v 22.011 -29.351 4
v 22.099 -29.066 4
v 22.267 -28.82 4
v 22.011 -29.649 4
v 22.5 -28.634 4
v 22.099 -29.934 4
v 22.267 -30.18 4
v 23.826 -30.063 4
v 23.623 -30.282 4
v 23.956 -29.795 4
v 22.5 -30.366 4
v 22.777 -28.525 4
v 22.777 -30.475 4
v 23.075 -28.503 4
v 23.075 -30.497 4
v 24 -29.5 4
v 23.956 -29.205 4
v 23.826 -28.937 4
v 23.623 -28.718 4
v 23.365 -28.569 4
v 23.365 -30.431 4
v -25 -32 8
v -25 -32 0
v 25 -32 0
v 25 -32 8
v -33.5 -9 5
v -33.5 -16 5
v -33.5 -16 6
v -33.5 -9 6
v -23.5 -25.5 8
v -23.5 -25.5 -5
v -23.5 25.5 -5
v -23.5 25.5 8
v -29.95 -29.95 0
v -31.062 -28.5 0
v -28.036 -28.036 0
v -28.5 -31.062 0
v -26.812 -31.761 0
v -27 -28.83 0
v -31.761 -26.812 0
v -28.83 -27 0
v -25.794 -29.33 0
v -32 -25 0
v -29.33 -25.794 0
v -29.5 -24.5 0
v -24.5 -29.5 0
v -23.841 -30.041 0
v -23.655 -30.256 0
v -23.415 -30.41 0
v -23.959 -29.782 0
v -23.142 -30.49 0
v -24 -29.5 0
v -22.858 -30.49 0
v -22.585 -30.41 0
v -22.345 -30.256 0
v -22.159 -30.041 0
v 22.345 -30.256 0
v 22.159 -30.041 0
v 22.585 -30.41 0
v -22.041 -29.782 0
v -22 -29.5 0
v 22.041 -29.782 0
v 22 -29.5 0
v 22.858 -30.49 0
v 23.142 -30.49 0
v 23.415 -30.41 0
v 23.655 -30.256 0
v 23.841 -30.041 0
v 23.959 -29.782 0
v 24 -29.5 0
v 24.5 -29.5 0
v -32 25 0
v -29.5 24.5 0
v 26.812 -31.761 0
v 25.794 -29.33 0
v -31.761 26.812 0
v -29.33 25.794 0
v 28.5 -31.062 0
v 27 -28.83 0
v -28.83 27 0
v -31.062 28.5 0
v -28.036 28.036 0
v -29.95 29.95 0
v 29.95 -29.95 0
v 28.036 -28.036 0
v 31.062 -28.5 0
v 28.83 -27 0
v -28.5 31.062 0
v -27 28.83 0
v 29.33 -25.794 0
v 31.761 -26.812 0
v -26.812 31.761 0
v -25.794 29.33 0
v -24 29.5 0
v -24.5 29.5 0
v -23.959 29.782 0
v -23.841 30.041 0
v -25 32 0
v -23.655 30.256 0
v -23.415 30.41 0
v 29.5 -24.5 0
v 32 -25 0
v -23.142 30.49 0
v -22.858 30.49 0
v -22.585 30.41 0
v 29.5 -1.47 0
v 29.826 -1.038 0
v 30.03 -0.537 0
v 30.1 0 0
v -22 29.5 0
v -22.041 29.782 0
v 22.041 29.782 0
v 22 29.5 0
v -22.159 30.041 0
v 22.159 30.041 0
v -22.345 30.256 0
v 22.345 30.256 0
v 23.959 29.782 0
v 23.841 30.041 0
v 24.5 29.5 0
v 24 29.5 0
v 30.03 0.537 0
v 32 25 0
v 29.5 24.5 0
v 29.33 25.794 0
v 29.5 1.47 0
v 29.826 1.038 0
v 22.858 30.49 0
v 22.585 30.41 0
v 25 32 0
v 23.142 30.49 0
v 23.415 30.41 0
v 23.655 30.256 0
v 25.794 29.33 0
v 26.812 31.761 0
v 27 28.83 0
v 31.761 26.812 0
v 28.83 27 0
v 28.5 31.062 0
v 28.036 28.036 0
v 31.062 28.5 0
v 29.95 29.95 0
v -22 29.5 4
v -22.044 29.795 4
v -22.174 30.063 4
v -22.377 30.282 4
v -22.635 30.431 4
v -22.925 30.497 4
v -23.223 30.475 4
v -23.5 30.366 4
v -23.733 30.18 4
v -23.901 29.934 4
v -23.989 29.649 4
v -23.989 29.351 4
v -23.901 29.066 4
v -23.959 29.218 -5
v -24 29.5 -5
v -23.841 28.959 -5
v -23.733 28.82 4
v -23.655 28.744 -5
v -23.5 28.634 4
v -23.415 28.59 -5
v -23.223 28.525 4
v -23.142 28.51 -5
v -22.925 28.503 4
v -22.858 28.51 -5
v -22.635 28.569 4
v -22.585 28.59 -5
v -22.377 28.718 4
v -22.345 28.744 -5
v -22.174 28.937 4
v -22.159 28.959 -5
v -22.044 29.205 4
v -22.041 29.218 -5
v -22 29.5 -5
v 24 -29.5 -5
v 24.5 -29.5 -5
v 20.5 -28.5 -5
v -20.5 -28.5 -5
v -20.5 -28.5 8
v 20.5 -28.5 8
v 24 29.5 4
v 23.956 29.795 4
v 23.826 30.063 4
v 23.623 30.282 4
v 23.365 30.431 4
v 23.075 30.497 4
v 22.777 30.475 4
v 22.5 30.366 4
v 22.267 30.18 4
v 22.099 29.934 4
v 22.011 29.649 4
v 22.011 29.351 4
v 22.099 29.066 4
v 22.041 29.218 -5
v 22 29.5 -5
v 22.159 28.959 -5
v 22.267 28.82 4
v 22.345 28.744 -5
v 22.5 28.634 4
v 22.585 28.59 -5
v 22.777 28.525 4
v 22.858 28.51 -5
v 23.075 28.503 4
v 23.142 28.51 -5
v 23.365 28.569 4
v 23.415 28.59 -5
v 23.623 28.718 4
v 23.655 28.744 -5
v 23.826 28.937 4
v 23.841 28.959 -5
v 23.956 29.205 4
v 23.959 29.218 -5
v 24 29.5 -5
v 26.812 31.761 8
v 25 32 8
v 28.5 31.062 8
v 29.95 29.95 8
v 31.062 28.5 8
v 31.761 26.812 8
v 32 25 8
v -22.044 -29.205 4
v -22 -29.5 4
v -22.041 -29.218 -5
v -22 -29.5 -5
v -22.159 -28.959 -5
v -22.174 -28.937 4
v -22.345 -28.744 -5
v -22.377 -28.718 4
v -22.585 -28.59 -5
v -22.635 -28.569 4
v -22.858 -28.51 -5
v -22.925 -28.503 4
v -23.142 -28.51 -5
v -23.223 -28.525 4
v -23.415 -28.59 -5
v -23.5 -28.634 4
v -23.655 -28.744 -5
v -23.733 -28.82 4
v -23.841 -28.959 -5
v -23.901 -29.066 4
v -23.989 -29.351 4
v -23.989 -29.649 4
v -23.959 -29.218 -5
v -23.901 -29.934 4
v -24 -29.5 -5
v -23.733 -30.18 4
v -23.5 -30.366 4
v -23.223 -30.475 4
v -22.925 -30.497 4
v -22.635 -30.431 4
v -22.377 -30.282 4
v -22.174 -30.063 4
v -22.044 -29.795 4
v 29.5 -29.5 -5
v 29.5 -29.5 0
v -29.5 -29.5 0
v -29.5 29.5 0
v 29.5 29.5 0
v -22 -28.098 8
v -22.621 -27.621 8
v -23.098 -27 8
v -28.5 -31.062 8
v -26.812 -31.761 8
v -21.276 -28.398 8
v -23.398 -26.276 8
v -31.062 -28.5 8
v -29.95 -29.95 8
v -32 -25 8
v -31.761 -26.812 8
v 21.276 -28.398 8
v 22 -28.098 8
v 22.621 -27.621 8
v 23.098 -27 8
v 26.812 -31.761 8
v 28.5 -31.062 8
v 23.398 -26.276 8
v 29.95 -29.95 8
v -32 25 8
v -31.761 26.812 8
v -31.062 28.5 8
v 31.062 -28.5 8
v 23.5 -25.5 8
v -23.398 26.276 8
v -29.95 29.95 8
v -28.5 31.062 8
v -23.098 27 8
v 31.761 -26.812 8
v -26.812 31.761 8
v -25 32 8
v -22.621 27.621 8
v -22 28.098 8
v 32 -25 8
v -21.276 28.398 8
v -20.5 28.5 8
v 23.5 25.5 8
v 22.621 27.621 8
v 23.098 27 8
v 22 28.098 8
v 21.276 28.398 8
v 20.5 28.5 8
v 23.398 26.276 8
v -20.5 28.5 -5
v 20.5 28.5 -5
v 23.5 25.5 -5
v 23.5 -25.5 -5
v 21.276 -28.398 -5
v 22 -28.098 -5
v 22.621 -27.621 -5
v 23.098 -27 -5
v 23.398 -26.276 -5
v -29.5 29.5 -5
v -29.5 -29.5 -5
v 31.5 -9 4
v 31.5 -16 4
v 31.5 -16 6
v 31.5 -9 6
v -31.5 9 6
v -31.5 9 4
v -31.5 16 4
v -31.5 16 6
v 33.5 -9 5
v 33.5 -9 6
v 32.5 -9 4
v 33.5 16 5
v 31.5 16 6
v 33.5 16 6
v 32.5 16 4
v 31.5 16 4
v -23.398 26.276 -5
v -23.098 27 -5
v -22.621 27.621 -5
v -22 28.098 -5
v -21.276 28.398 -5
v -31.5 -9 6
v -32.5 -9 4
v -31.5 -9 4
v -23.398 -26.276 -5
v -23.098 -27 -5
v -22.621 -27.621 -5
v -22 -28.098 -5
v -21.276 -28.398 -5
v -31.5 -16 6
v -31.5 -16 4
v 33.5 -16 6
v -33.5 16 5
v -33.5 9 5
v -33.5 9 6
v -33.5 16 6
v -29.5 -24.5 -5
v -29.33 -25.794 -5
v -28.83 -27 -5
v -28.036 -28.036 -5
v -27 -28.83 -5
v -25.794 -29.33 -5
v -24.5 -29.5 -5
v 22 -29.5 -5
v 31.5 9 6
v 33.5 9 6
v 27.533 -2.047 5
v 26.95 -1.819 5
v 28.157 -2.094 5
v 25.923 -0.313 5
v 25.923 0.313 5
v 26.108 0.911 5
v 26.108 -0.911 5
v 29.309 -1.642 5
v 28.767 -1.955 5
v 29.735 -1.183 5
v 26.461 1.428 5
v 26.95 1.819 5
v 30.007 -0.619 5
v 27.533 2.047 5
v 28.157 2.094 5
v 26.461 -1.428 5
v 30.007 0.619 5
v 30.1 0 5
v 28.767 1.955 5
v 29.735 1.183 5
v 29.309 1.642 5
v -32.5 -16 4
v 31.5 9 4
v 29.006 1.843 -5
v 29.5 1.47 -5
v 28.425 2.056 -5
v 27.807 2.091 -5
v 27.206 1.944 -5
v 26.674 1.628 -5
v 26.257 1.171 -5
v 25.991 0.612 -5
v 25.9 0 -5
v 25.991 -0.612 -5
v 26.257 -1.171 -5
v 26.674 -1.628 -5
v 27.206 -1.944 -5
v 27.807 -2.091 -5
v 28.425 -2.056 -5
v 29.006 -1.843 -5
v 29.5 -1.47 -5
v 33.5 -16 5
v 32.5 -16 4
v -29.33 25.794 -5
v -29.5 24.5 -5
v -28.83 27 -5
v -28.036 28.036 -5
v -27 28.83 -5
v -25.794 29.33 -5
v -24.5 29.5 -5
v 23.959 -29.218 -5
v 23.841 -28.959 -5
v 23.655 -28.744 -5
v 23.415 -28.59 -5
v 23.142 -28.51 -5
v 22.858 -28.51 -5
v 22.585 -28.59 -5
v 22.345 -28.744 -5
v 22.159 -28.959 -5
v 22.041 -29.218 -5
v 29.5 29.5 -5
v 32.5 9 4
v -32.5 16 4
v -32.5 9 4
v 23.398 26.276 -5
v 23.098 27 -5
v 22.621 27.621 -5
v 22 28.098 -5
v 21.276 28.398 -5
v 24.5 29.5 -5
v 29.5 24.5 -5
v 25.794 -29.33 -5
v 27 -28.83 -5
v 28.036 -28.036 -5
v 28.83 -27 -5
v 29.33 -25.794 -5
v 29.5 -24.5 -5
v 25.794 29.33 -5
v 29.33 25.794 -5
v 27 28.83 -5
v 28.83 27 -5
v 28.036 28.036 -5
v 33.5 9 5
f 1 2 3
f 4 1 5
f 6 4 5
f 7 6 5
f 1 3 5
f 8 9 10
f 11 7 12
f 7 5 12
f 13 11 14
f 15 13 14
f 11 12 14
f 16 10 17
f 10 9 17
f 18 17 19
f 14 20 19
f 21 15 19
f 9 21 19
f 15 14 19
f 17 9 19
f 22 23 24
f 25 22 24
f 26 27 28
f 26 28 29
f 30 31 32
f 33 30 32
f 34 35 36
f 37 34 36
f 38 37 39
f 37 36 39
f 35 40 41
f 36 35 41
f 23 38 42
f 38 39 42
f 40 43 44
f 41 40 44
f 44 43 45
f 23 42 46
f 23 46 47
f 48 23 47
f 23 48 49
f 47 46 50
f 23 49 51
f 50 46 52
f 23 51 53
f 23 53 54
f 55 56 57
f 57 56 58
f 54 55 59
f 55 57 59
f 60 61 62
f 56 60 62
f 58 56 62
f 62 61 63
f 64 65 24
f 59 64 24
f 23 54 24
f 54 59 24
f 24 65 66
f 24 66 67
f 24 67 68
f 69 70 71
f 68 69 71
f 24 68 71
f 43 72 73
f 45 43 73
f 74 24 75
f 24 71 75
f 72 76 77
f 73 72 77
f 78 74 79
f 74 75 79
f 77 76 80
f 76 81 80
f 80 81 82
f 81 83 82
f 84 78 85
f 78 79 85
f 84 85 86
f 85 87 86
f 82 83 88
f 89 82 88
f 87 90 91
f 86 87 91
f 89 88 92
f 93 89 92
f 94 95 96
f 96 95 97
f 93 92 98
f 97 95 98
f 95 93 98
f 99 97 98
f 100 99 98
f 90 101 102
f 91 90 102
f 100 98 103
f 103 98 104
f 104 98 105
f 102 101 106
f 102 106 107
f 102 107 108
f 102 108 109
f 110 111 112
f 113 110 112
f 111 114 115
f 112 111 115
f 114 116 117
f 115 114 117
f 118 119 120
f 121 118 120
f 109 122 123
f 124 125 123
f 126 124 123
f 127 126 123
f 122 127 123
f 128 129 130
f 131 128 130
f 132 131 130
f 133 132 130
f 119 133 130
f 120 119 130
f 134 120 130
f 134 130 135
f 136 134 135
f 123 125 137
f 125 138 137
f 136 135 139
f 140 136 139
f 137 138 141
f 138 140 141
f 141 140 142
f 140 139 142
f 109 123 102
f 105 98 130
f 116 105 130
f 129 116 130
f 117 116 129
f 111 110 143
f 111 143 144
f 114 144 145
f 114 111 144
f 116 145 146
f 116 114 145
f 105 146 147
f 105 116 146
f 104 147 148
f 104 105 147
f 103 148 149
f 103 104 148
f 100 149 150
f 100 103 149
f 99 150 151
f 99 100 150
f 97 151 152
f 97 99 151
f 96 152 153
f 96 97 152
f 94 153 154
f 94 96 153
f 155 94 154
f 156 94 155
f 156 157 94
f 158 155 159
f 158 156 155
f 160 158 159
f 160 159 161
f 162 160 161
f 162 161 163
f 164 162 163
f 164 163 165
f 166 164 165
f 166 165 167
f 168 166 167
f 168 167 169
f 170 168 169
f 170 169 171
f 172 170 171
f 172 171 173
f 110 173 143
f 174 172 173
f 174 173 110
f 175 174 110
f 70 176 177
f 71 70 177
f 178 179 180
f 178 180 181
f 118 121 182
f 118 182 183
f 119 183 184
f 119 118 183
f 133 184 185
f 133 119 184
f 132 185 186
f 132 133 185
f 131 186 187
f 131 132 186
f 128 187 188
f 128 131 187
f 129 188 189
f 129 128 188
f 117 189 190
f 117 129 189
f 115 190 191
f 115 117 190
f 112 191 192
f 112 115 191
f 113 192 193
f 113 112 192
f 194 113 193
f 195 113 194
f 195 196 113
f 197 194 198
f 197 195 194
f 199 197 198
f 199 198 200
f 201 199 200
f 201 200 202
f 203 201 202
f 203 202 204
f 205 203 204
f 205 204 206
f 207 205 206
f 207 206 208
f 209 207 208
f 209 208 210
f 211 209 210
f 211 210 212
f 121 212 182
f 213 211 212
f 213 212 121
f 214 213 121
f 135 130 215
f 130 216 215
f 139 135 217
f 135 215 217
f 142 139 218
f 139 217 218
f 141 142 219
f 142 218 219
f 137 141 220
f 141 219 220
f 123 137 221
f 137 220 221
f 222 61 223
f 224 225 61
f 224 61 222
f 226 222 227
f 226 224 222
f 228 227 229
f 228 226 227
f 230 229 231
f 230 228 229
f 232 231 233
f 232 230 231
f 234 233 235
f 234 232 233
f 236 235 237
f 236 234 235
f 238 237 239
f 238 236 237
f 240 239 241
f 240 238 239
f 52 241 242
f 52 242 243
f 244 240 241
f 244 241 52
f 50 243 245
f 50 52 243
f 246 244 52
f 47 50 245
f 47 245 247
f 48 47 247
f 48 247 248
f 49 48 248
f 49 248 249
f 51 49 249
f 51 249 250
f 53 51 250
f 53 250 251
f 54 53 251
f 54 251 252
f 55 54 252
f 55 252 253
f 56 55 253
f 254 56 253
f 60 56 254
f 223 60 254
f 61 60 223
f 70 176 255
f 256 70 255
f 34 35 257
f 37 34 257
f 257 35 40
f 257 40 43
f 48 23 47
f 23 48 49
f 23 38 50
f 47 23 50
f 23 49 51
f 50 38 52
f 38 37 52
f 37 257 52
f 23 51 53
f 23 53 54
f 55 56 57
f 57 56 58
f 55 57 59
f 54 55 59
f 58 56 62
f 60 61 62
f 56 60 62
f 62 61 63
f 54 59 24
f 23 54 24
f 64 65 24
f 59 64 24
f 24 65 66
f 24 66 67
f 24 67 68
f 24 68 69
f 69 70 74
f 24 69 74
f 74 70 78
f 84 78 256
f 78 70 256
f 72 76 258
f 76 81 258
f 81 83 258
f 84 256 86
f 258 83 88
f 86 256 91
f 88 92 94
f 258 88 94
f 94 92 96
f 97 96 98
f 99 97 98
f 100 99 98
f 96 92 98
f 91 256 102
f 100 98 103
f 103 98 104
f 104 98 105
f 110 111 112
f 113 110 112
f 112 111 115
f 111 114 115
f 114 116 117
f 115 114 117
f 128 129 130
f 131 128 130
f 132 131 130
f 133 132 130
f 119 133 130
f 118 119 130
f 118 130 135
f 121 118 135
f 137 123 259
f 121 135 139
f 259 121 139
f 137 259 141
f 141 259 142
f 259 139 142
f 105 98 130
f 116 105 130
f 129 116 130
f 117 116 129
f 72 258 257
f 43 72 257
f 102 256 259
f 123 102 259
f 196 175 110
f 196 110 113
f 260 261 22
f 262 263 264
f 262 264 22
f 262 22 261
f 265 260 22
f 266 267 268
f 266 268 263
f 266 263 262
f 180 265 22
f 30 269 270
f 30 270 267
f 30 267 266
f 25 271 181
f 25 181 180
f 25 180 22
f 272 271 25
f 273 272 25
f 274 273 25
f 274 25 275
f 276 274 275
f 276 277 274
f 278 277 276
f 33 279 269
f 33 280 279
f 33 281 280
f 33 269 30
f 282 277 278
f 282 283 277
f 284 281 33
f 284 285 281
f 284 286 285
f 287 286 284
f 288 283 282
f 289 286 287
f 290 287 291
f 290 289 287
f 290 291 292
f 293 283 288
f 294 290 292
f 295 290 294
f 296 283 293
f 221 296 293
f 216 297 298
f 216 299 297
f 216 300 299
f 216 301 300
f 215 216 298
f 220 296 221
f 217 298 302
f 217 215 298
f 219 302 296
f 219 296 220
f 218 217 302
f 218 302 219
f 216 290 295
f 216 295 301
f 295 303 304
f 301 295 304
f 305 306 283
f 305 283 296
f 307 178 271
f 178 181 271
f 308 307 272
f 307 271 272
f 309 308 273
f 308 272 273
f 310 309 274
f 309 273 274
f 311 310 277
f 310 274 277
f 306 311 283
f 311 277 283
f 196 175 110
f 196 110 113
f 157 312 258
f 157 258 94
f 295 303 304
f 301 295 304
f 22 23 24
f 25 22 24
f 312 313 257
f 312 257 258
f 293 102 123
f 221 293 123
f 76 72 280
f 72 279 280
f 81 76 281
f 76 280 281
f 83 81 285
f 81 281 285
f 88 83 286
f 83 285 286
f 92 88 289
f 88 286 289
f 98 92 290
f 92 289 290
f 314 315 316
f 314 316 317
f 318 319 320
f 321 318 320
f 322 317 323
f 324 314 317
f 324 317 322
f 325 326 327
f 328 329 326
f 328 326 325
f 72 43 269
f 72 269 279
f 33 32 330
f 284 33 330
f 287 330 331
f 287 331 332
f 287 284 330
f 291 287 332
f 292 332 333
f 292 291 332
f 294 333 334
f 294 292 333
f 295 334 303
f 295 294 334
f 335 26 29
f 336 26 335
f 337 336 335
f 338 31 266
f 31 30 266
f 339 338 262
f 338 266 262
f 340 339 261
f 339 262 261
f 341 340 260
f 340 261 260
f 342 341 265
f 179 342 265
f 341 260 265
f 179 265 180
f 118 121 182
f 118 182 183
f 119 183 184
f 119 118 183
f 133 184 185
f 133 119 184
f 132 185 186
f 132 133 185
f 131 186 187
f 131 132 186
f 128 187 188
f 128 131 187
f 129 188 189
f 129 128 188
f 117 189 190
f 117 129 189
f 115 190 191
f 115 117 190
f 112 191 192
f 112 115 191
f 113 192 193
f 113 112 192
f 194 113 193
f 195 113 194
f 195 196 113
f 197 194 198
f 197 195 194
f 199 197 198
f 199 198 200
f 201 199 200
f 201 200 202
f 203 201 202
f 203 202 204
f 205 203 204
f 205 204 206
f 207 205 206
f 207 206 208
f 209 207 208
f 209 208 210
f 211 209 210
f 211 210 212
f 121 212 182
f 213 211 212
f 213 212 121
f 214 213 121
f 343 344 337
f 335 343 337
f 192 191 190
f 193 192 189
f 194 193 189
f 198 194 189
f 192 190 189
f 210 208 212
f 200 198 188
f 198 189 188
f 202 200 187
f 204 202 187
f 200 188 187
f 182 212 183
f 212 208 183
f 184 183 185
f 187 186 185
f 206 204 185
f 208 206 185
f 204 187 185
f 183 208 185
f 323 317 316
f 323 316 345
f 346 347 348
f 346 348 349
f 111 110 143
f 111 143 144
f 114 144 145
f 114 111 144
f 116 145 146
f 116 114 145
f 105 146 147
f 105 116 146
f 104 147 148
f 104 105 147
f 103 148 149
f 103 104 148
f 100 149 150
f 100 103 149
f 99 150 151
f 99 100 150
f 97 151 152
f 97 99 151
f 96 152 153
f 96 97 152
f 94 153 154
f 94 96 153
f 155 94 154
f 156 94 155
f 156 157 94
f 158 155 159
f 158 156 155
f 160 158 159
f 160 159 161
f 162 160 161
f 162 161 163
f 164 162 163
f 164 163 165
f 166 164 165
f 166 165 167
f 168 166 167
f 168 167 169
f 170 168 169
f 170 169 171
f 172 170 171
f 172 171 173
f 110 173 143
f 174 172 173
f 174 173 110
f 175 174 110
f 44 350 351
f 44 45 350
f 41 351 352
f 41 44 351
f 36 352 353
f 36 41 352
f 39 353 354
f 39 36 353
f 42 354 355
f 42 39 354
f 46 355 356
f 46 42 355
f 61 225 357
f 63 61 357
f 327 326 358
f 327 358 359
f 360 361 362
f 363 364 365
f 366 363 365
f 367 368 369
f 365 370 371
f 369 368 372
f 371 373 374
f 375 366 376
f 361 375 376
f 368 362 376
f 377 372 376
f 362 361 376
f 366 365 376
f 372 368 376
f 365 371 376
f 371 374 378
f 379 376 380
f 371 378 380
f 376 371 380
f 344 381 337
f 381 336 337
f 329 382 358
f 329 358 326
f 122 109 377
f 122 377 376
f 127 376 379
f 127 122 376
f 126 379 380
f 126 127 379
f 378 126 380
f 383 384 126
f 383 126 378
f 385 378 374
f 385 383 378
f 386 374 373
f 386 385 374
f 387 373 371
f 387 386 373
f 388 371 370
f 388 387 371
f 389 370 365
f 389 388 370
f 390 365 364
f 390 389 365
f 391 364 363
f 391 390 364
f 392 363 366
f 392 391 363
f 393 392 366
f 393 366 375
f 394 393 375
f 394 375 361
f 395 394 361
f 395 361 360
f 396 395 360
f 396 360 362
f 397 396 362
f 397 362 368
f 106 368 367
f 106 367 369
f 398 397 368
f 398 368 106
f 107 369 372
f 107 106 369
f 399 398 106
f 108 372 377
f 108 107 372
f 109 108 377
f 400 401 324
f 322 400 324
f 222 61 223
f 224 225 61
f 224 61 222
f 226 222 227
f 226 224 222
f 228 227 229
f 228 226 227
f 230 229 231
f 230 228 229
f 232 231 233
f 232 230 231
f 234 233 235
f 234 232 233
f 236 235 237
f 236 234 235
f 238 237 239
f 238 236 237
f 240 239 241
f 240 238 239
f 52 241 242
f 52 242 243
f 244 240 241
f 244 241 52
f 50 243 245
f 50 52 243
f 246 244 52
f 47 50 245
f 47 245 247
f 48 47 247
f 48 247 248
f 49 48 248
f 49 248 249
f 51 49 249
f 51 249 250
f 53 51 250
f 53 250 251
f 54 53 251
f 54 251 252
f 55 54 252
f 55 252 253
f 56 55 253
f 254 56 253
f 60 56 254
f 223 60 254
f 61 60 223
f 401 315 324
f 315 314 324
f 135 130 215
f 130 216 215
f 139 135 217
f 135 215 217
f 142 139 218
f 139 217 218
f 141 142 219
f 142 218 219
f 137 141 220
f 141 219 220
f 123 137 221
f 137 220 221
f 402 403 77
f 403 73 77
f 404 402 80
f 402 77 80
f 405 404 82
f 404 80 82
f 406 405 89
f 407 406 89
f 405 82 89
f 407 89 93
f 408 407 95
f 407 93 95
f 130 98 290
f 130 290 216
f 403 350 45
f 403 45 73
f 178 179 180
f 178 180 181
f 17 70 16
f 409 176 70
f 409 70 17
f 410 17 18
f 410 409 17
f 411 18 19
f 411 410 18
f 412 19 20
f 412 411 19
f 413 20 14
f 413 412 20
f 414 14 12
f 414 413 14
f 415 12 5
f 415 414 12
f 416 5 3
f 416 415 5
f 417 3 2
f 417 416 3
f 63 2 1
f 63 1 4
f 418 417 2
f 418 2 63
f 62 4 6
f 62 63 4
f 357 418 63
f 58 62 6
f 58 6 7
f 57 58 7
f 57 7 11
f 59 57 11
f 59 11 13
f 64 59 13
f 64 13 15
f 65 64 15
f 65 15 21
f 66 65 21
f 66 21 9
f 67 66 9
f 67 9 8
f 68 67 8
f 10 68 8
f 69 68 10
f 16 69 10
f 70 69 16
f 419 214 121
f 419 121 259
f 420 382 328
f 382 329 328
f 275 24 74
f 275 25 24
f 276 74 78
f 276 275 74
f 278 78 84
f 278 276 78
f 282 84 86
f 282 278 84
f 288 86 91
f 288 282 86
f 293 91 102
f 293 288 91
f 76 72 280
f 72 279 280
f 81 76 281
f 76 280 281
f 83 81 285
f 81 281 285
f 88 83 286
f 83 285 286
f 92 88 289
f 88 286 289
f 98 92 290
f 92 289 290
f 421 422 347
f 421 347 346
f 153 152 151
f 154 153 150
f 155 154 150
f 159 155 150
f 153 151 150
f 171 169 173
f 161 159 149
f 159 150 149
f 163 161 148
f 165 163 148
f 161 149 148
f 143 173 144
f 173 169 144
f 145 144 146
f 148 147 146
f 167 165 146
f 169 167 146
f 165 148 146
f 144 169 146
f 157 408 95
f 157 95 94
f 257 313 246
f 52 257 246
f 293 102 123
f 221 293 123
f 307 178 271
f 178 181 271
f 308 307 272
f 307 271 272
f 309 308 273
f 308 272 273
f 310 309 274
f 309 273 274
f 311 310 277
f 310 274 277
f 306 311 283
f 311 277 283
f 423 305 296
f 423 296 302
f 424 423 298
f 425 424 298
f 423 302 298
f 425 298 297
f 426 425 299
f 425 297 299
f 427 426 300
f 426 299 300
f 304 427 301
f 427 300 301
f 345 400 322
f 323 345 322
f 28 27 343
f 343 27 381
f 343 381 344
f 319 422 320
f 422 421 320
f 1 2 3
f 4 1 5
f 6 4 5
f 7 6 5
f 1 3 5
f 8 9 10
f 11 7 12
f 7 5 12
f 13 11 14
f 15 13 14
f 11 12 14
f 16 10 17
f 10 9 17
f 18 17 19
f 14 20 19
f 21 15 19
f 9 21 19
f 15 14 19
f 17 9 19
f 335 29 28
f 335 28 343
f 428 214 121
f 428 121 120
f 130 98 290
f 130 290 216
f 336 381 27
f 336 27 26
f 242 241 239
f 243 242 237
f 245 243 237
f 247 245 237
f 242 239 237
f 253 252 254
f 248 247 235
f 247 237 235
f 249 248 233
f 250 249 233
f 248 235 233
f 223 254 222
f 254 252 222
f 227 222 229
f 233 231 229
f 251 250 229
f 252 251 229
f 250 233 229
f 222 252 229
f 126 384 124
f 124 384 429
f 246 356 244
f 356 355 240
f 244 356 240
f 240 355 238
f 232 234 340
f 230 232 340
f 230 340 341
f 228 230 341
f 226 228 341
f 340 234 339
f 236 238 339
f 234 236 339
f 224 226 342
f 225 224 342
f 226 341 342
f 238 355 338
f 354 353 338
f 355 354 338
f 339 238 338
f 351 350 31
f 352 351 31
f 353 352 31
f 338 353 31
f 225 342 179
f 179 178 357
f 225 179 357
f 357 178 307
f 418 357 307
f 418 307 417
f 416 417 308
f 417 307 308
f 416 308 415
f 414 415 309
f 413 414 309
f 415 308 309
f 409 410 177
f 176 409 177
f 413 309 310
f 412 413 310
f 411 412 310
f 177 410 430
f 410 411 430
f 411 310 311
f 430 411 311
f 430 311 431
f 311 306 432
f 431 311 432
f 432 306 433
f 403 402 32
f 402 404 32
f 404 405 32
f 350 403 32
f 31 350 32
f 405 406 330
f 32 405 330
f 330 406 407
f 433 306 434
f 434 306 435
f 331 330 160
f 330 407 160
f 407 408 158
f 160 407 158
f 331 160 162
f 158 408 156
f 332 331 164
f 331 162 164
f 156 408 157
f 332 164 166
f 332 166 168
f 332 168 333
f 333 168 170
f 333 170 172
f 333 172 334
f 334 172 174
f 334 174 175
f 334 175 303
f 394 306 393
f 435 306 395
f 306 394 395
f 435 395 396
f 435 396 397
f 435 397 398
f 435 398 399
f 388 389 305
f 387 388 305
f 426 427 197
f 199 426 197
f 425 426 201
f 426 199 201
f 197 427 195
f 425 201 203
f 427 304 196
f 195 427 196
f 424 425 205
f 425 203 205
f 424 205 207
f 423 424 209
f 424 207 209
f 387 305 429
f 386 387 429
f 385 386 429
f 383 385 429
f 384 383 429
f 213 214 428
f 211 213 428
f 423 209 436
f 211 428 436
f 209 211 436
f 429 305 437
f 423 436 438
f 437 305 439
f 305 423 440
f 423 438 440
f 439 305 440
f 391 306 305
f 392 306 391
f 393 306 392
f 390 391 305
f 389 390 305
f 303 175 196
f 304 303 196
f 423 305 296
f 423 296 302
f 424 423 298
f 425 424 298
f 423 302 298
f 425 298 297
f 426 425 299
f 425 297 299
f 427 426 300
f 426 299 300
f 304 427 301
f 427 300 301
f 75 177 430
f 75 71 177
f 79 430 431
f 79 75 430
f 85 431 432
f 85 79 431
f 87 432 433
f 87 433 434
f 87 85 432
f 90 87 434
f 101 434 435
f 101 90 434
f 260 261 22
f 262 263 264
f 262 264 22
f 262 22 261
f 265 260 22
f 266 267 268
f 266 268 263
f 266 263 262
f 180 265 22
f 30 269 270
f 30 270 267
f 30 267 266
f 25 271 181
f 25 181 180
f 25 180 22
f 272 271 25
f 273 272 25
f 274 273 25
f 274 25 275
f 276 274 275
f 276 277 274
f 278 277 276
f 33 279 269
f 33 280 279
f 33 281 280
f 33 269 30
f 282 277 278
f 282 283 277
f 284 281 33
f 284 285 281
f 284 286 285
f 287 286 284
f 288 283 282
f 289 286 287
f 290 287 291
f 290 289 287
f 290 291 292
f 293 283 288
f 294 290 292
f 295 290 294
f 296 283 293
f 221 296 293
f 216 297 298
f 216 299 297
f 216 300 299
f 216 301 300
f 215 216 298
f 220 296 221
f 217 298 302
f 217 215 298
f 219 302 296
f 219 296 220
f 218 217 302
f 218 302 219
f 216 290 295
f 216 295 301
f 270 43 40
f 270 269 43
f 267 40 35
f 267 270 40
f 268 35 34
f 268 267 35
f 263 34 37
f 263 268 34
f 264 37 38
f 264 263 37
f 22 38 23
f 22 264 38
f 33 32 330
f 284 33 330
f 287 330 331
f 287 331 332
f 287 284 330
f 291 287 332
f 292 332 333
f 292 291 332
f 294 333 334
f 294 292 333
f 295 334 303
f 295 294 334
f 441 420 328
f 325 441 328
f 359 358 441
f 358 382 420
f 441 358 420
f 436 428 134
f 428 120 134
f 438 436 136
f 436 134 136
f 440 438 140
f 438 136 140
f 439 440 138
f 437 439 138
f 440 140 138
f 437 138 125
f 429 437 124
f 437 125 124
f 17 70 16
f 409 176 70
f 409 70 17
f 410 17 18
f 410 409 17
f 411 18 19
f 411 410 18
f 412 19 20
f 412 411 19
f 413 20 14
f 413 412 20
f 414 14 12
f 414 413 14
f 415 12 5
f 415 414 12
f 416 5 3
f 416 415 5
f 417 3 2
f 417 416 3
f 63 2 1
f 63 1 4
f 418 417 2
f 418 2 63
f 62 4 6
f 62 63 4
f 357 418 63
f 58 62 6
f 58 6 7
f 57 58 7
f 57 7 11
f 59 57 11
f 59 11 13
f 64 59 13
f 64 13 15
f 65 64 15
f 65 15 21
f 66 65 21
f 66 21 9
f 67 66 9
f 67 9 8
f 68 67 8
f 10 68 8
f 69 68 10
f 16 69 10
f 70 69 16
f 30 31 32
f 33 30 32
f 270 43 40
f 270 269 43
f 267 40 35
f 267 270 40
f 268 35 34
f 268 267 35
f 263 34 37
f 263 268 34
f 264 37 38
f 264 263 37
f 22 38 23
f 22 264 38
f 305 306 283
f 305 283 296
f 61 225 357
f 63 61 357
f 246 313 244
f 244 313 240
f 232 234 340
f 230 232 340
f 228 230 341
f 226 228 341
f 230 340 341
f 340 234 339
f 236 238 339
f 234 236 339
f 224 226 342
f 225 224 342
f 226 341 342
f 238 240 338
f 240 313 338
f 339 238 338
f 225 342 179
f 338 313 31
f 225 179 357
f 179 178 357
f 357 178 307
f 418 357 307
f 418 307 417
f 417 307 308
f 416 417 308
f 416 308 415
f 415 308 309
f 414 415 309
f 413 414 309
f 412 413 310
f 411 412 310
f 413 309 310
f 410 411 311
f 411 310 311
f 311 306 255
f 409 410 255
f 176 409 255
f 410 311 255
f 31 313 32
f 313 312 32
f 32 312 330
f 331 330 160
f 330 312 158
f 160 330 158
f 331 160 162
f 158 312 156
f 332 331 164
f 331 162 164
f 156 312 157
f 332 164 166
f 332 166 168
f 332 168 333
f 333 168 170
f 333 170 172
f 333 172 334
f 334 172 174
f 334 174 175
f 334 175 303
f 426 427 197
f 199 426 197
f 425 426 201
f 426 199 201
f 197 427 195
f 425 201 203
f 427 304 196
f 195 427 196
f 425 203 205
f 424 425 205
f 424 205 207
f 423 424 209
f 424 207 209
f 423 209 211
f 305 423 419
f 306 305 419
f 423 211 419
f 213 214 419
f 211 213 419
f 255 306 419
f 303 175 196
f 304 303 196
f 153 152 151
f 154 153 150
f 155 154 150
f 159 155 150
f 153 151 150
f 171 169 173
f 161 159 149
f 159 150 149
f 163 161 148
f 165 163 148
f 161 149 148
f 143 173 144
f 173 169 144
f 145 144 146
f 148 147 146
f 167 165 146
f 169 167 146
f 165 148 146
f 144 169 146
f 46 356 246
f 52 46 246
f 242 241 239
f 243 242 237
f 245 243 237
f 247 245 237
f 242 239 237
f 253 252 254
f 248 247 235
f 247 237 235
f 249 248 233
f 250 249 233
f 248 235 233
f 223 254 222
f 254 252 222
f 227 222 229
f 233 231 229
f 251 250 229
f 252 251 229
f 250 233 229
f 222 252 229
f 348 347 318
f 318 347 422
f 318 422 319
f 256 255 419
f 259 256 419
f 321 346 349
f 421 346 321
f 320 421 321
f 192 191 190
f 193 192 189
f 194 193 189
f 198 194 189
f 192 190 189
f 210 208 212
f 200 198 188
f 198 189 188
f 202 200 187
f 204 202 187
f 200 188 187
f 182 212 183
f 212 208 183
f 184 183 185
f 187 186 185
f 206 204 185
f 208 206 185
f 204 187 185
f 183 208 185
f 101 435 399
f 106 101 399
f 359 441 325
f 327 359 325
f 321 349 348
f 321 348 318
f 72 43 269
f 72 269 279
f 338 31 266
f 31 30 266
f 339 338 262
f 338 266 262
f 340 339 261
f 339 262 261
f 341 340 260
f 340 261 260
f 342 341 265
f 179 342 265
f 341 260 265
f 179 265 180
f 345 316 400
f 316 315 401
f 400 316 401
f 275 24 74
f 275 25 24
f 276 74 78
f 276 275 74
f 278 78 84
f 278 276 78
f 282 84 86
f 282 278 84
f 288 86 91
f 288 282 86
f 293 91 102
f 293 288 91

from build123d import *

# Parameters (mm, degrees)
BOX003_W          = 2
BOX003_H          = 7
BOX003_DEPTH      = 2
CHAMFER_SIZE      = 1
BOX004_W          = 2
BOX004_H          = 7
BOX004_DEPTH      = 2
CHAMFER001_SIZE   = 1
BOX005_W          = 2
BOX005_H          = 7
BOX005_DEPTH      = 2
CHAMFER002_SIZE   = 1
BOX006_W          = 2
BOX006_H          = 7
BOX006_DEPTH      = 2
CHAMFER003_SIZE   = 1
CYLINDER003_R     = 1
CYLINDER003_DEPTH = 27
CYLINDER002_R     = 1
CYLINDER002_DEPTH = 27
CYLINDER_R        = 1
CYLINDER_DEPTH    = 27
CYLINDER001_R     = 1
CYLINDER001_DEPTH = 27
BOX002_W          = 47
BOX002_H          = 57
BOX002_DEPTH      = 40
BOX001_W          = 59
BOX001_H          = 59
BOX001_DEPTH      = 5
BOX_W             = 64
BOX_H             = 64
BOX_DEPTH         = 8
FILLET_R          = 7
FILLET001_R       = 3
CYLINDER004_R     = 2.1
CYLINDER004_DEPTH = 20
FILLET002_R       = 5


with BuildPart() as chamfer_body:
    # Box003 → Box003 (new body)
    with BuildSketch(Plane(origin=(-33.5, 9, 4), x_dir=(1, 0, 0), z_dir=(0, 0, 1))):
        with Locations((1, 3.5)):
            Rectangle(BOX003_W, BOX003_H)
    extrude(amount=BOX003_DEPTH)

    # Chamfer
    chamfer_edges = [chamfer_body.edges().sort_by_distance(p)[0] for p in [
        (-33.5, 12.5, 4),
    ]]
    chamfer(chamfer_edges, length=CHAMFER_SIZE)


with BuildPart() as chamfer001:
    # Box004 → Box004 (new body)
    with BuildSketch(Plane(origin=(-33.5, -16, 4), x_dir=(1, 0, 0), z_dir=(0, 0, 1))):
        with Locations((1, 3.5)):
            Rectangle(BOX004_W, BOX004_H)
    extrude(amount=BOX004_DEPTH)

    # Chamfer001
    chamfer001_edges = [chamfer001.edges().sort_by_distance(p)[0] for p in [
        (-33.5, -12.5, 4),
    ]]
    chamfer(chamfer001_edges, length=CHAMFER001_SIZE)


with BuildPart() as chamfer002:
    # Box005 → Box005 (new body)
    with BuildSketch(Plane(origin=(31.5, -16, 4), x_dir=(1, 0, 0), z_dir=(0, 0, 1))):
        with Locations((1, 3.5)):
            Rectangle(BOX005_W, BOX005_H)
    extrude(amount=BOX005_DEPTH)

    # Chamfer002
    chamfer002_edges = [chamfer002.edges().sort_by_distance(p)[0] for p in [
        (33.5, -12.5, 4),
    ]]
    chamfer(chamfer002_edges, length=CHAMFER002_SIZE)


with BuildPart() as chamfer003:
    # Box006 → Box006 (new body)
    with BuildSketch(Plane(origin=(31.5, 9, 4), x_dir=(1, 0, 0), z_dir=(0, 0, 1))):
        with Locations((1, 3.5)):
            Rectangle(BOX006_W, BOX006_H)
    extrude(amount=BOX006_DEPTH)

    # Chamfer003
    chamfer003_edges = [chamfer003.edges().sort_by_distance(p)[0] for p in [
        (33.5, 12.5, 4),
    ]]
    chamfer(chamfer003_edges, length=CHAMFER003_SIZE)


with BuildPart() as cylinder003:
    # Cylinder003 → Cylinder003 (new body)
    with BuildSketch(Plane(origin=(23, -29.5, -23), x_dir=(1, 0, 0), z_dir=(0, 0, 1))):
        Circle(CYLINDER003_R)
    extrude(amount=CYLINDER003_DEPTH)


with BuildPart() as cylinder002:
    # Cylinder002 → Cylinder002 (new body)
    with BuildSketch(Plane(origin=(-23, -29.5, -23), x_dir=(1, 0, 0), z_dir=(0, 0, 1))):
        Circle(CYLINDER002_R)
    extrude(amount=CYLINDER002_DEPTH)


with BuildPart() as cylinder:
    # Cylinder → Cylinder (new body)
    with BuildSketch(Plane(origin=(23, 29.5, -23), x_dir=(1, 0, 0), z_dir=(0, 0, 1))):
        Circle(CYLINDER_R)
    extrude(amount=CYLINDER_DEPTH)


with BuildPart() as cylinder001:
    # Cylinder001 → Cylinder001 (new body)
    with BuildSketch(Plane(origin=(-23, 29.5, -23), x_dir=(1, 0, 0), z_dir=(0, 0, 1))):
        Circle(CYLINDER001_R)
    extrude(amount=CYLINDER001_DEPTH)


with BuildPart() as cube002:
    # Box002 → Box002 (new body)
    with BuildSketch(Plane(origin=(-23.5, -28.5, -20), x_dir=(1, 0, 0), z_dir=(0, 0, 1))):
        with Locations((23.5, 28.5)):
            Rectangle(BOX002_W, BOX002_H)
    extrude(amount=BOX002_DEPTH)


with BuildPart() as cube001:
    # Box001 → Box001 (new body)
    with BuildSketch(Plane(origin=(-29.5, -29.5, -5), x_dir=(1, 0, 0), z_dir=(0, 0, 1))):
        with Locations((29.5, 29.5)):
            Rectangle(BOX001_W, BOX001_H)
    extrude(amount=BOX001_DEPTH)


with BuildPart() as fillet001:
    # Box → Box (new body)
    with BuildSketch(Plane(origin=(-32, -32, 0), x_dir=(1, 0, 0), z_dir=(0, 0, 1))):
        with Locations((32, 32)):
            Rectangle(BOX_W, BOX_H)
    extrude(amount=BOX_DEPTH)

    # Fusion: union Cube001
    add(cube001.part)

    # Cut: cut Cube002
    add(cube002.part, mode=Mode.SUBTRACT)

    # Fillet
    fillet_edges = [fillet001.edges().sort_by_distance(p)[0] for p in [
        (-32, -32, 4),
        (-32, 32, 4),
        (32, -32, 4),
        (32, 32, 4),
    ]]
    fillet(fillet_edges, radius=FILLET_R)

    # Fillet001
    fillet001_edges = [fillet001.edges().sort_by_distance(p)[0] for p in [
        (23.5, -28.5, 1.5),
        (-23.5, -28.5, 1.5),
        (23.5, 28.5, 1.5),
        (-23.5, 28.5, 1.5),
    ]]
    fillet(fillet001_edges, radius=FILLET001_R)


with BuildPart() as cut004:
    # Cut001 base: copy of Fillet001
    add(fillet001.part)

    # Cut001: cut Cylinder001
    add(cylinder001.part, mode=Mode.SUBTRACT)

    # Cut002: cut Cylinder
    add(cylinder.part, mode=Mode.SUBTRACT)

    # Cut003: cut Cylinder002
    add(cylinder002.part, mode=Mode.SUBTRACT)

    # Cut004: cut Cylinder003
    add(cylinder003.part, mode=Mode.SUBTRACT)


with BuildPart() as cylinder004:
    # Cylinder004 → Cylinder004 (new body)
    with BuildSketch(Plane(origin=(28, 0, -15), x_dir=(1, 0, 0), z_dir=(0, 0, 1))):
        Circle(CYLINDER004_R)
    extrude(amount=CYLINDER004_DEPTH)


with BuildPart() as cut009:
    # Fillet002 base: copy of Fillet001
    add(fillet001.part)

    # Fillet002
    fillet002_edges = [cut009.edges().sort_by_distance(p)[0] for p in [
        (-29.5, -29.5, -2.5),
        (-29.5, 29.5, -2.5),
        (29.5, 29.5, -2.5),
        (29.5, -29.5, -2.5),
    ]]
    fillet(fillet002_edges, radius=FILLET002_R)

    # Cut005: cut Cylinder001
    add(cylinder001.part, mode=Mode.SUBTRACT)

    # Cut006: cut Cylinder
    add(cylinder.part, mode=Mode.SUBTRACT)

    # Cut007: cut Cylinder002
    add(cylinder002.part, mode=Mode.SUBTRACT)

    # Cut008: cut Cylinder003
    add(cylinder003.part, mode=Mode.SUBTRACT)

    # Cut009: cut Cylinder004
    add(cylinder004.part, mode=Mode.SUBTRACT)


solid = Compound([chamfer_body.part, chamfer001.part, chamfer002.part, chamfer003.part, cut004.part, cut009.part])
